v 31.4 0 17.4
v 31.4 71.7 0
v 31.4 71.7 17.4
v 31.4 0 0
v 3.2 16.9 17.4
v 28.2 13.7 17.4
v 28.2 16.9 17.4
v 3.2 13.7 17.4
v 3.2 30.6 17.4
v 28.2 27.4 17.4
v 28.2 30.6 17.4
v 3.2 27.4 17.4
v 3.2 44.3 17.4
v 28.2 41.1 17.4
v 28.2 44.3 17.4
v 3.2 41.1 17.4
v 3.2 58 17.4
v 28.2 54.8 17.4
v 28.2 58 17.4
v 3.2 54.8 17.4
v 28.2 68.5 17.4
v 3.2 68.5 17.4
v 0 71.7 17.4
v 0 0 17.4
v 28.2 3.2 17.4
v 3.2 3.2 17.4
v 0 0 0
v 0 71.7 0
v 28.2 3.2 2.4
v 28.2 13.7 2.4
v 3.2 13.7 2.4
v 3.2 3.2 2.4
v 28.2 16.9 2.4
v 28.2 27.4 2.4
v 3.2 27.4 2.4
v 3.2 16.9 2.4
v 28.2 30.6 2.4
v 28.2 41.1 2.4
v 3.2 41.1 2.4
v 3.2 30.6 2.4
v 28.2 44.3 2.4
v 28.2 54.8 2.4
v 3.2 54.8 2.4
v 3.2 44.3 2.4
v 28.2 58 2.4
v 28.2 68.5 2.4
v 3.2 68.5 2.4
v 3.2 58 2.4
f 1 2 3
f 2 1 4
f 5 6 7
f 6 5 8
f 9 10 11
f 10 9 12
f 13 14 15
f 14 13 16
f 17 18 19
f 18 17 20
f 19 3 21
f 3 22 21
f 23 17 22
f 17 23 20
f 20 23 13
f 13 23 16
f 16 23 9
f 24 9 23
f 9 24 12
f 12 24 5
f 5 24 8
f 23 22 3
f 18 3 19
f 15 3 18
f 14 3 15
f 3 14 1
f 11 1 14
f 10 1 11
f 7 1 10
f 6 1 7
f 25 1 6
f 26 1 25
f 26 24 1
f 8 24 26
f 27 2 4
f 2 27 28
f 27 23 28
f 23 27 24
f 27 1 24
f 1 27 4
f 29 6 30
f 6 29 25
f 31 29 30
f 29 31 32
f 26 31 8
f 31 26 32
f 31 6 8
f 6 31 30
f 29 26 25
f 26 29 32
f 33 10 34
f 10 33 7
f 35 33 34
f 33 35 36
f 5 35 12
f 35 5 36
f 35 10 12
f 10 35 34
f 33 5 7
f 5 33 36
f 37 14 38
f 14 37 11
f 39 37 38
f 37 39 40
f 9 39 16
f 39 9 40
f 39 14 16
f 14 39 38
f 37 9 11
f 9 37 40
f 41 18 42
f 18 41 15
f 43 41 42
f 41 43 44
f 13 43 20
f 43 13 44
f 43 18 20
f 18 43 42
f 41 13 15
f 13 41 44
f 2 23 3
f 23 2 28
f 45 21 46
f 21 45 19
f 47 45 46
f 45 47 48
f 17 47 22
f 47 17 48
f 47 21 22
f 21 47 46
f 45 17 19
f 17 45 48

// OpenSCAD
//Battery width
lipo_w = 25;
//Battery height
lipo_h = 43;
//Battery thickness
lipo_t = 10.5;

//Number of rows
rows = 1;
//Number of lipos in row
lipos_in_row = 5;

//Container walls height
container_wall_h = 15;
//Container walls thickness
container_wall_t = 3.2;
//Container floor height
container_floor_h = 2.4;


module lipo(){
    cube([lipo_w, lipo_t, lipo_h]);
}

module single_lipo_container(){
    difference(){
        cube([lipo_w+2*container_wall_t, lipo_t+2*container_wall_t, container_wall_h+container_floor_h]);
        translate([container_wall_t, container_wall_t, container_floor_h])
        lipo();
    }
}

module lipo_container(){
    for(row_count=[1 : 1 : rows]){
        for(x=[1 : 1 : lipos_in_row]){
            translate([(lipo_w+container_wall_t)*(row_count-1), (lipo_t+container_wall_t)*(x-1), 0])
            single_lipo_container();
        }
    }
}

lipo_container();
